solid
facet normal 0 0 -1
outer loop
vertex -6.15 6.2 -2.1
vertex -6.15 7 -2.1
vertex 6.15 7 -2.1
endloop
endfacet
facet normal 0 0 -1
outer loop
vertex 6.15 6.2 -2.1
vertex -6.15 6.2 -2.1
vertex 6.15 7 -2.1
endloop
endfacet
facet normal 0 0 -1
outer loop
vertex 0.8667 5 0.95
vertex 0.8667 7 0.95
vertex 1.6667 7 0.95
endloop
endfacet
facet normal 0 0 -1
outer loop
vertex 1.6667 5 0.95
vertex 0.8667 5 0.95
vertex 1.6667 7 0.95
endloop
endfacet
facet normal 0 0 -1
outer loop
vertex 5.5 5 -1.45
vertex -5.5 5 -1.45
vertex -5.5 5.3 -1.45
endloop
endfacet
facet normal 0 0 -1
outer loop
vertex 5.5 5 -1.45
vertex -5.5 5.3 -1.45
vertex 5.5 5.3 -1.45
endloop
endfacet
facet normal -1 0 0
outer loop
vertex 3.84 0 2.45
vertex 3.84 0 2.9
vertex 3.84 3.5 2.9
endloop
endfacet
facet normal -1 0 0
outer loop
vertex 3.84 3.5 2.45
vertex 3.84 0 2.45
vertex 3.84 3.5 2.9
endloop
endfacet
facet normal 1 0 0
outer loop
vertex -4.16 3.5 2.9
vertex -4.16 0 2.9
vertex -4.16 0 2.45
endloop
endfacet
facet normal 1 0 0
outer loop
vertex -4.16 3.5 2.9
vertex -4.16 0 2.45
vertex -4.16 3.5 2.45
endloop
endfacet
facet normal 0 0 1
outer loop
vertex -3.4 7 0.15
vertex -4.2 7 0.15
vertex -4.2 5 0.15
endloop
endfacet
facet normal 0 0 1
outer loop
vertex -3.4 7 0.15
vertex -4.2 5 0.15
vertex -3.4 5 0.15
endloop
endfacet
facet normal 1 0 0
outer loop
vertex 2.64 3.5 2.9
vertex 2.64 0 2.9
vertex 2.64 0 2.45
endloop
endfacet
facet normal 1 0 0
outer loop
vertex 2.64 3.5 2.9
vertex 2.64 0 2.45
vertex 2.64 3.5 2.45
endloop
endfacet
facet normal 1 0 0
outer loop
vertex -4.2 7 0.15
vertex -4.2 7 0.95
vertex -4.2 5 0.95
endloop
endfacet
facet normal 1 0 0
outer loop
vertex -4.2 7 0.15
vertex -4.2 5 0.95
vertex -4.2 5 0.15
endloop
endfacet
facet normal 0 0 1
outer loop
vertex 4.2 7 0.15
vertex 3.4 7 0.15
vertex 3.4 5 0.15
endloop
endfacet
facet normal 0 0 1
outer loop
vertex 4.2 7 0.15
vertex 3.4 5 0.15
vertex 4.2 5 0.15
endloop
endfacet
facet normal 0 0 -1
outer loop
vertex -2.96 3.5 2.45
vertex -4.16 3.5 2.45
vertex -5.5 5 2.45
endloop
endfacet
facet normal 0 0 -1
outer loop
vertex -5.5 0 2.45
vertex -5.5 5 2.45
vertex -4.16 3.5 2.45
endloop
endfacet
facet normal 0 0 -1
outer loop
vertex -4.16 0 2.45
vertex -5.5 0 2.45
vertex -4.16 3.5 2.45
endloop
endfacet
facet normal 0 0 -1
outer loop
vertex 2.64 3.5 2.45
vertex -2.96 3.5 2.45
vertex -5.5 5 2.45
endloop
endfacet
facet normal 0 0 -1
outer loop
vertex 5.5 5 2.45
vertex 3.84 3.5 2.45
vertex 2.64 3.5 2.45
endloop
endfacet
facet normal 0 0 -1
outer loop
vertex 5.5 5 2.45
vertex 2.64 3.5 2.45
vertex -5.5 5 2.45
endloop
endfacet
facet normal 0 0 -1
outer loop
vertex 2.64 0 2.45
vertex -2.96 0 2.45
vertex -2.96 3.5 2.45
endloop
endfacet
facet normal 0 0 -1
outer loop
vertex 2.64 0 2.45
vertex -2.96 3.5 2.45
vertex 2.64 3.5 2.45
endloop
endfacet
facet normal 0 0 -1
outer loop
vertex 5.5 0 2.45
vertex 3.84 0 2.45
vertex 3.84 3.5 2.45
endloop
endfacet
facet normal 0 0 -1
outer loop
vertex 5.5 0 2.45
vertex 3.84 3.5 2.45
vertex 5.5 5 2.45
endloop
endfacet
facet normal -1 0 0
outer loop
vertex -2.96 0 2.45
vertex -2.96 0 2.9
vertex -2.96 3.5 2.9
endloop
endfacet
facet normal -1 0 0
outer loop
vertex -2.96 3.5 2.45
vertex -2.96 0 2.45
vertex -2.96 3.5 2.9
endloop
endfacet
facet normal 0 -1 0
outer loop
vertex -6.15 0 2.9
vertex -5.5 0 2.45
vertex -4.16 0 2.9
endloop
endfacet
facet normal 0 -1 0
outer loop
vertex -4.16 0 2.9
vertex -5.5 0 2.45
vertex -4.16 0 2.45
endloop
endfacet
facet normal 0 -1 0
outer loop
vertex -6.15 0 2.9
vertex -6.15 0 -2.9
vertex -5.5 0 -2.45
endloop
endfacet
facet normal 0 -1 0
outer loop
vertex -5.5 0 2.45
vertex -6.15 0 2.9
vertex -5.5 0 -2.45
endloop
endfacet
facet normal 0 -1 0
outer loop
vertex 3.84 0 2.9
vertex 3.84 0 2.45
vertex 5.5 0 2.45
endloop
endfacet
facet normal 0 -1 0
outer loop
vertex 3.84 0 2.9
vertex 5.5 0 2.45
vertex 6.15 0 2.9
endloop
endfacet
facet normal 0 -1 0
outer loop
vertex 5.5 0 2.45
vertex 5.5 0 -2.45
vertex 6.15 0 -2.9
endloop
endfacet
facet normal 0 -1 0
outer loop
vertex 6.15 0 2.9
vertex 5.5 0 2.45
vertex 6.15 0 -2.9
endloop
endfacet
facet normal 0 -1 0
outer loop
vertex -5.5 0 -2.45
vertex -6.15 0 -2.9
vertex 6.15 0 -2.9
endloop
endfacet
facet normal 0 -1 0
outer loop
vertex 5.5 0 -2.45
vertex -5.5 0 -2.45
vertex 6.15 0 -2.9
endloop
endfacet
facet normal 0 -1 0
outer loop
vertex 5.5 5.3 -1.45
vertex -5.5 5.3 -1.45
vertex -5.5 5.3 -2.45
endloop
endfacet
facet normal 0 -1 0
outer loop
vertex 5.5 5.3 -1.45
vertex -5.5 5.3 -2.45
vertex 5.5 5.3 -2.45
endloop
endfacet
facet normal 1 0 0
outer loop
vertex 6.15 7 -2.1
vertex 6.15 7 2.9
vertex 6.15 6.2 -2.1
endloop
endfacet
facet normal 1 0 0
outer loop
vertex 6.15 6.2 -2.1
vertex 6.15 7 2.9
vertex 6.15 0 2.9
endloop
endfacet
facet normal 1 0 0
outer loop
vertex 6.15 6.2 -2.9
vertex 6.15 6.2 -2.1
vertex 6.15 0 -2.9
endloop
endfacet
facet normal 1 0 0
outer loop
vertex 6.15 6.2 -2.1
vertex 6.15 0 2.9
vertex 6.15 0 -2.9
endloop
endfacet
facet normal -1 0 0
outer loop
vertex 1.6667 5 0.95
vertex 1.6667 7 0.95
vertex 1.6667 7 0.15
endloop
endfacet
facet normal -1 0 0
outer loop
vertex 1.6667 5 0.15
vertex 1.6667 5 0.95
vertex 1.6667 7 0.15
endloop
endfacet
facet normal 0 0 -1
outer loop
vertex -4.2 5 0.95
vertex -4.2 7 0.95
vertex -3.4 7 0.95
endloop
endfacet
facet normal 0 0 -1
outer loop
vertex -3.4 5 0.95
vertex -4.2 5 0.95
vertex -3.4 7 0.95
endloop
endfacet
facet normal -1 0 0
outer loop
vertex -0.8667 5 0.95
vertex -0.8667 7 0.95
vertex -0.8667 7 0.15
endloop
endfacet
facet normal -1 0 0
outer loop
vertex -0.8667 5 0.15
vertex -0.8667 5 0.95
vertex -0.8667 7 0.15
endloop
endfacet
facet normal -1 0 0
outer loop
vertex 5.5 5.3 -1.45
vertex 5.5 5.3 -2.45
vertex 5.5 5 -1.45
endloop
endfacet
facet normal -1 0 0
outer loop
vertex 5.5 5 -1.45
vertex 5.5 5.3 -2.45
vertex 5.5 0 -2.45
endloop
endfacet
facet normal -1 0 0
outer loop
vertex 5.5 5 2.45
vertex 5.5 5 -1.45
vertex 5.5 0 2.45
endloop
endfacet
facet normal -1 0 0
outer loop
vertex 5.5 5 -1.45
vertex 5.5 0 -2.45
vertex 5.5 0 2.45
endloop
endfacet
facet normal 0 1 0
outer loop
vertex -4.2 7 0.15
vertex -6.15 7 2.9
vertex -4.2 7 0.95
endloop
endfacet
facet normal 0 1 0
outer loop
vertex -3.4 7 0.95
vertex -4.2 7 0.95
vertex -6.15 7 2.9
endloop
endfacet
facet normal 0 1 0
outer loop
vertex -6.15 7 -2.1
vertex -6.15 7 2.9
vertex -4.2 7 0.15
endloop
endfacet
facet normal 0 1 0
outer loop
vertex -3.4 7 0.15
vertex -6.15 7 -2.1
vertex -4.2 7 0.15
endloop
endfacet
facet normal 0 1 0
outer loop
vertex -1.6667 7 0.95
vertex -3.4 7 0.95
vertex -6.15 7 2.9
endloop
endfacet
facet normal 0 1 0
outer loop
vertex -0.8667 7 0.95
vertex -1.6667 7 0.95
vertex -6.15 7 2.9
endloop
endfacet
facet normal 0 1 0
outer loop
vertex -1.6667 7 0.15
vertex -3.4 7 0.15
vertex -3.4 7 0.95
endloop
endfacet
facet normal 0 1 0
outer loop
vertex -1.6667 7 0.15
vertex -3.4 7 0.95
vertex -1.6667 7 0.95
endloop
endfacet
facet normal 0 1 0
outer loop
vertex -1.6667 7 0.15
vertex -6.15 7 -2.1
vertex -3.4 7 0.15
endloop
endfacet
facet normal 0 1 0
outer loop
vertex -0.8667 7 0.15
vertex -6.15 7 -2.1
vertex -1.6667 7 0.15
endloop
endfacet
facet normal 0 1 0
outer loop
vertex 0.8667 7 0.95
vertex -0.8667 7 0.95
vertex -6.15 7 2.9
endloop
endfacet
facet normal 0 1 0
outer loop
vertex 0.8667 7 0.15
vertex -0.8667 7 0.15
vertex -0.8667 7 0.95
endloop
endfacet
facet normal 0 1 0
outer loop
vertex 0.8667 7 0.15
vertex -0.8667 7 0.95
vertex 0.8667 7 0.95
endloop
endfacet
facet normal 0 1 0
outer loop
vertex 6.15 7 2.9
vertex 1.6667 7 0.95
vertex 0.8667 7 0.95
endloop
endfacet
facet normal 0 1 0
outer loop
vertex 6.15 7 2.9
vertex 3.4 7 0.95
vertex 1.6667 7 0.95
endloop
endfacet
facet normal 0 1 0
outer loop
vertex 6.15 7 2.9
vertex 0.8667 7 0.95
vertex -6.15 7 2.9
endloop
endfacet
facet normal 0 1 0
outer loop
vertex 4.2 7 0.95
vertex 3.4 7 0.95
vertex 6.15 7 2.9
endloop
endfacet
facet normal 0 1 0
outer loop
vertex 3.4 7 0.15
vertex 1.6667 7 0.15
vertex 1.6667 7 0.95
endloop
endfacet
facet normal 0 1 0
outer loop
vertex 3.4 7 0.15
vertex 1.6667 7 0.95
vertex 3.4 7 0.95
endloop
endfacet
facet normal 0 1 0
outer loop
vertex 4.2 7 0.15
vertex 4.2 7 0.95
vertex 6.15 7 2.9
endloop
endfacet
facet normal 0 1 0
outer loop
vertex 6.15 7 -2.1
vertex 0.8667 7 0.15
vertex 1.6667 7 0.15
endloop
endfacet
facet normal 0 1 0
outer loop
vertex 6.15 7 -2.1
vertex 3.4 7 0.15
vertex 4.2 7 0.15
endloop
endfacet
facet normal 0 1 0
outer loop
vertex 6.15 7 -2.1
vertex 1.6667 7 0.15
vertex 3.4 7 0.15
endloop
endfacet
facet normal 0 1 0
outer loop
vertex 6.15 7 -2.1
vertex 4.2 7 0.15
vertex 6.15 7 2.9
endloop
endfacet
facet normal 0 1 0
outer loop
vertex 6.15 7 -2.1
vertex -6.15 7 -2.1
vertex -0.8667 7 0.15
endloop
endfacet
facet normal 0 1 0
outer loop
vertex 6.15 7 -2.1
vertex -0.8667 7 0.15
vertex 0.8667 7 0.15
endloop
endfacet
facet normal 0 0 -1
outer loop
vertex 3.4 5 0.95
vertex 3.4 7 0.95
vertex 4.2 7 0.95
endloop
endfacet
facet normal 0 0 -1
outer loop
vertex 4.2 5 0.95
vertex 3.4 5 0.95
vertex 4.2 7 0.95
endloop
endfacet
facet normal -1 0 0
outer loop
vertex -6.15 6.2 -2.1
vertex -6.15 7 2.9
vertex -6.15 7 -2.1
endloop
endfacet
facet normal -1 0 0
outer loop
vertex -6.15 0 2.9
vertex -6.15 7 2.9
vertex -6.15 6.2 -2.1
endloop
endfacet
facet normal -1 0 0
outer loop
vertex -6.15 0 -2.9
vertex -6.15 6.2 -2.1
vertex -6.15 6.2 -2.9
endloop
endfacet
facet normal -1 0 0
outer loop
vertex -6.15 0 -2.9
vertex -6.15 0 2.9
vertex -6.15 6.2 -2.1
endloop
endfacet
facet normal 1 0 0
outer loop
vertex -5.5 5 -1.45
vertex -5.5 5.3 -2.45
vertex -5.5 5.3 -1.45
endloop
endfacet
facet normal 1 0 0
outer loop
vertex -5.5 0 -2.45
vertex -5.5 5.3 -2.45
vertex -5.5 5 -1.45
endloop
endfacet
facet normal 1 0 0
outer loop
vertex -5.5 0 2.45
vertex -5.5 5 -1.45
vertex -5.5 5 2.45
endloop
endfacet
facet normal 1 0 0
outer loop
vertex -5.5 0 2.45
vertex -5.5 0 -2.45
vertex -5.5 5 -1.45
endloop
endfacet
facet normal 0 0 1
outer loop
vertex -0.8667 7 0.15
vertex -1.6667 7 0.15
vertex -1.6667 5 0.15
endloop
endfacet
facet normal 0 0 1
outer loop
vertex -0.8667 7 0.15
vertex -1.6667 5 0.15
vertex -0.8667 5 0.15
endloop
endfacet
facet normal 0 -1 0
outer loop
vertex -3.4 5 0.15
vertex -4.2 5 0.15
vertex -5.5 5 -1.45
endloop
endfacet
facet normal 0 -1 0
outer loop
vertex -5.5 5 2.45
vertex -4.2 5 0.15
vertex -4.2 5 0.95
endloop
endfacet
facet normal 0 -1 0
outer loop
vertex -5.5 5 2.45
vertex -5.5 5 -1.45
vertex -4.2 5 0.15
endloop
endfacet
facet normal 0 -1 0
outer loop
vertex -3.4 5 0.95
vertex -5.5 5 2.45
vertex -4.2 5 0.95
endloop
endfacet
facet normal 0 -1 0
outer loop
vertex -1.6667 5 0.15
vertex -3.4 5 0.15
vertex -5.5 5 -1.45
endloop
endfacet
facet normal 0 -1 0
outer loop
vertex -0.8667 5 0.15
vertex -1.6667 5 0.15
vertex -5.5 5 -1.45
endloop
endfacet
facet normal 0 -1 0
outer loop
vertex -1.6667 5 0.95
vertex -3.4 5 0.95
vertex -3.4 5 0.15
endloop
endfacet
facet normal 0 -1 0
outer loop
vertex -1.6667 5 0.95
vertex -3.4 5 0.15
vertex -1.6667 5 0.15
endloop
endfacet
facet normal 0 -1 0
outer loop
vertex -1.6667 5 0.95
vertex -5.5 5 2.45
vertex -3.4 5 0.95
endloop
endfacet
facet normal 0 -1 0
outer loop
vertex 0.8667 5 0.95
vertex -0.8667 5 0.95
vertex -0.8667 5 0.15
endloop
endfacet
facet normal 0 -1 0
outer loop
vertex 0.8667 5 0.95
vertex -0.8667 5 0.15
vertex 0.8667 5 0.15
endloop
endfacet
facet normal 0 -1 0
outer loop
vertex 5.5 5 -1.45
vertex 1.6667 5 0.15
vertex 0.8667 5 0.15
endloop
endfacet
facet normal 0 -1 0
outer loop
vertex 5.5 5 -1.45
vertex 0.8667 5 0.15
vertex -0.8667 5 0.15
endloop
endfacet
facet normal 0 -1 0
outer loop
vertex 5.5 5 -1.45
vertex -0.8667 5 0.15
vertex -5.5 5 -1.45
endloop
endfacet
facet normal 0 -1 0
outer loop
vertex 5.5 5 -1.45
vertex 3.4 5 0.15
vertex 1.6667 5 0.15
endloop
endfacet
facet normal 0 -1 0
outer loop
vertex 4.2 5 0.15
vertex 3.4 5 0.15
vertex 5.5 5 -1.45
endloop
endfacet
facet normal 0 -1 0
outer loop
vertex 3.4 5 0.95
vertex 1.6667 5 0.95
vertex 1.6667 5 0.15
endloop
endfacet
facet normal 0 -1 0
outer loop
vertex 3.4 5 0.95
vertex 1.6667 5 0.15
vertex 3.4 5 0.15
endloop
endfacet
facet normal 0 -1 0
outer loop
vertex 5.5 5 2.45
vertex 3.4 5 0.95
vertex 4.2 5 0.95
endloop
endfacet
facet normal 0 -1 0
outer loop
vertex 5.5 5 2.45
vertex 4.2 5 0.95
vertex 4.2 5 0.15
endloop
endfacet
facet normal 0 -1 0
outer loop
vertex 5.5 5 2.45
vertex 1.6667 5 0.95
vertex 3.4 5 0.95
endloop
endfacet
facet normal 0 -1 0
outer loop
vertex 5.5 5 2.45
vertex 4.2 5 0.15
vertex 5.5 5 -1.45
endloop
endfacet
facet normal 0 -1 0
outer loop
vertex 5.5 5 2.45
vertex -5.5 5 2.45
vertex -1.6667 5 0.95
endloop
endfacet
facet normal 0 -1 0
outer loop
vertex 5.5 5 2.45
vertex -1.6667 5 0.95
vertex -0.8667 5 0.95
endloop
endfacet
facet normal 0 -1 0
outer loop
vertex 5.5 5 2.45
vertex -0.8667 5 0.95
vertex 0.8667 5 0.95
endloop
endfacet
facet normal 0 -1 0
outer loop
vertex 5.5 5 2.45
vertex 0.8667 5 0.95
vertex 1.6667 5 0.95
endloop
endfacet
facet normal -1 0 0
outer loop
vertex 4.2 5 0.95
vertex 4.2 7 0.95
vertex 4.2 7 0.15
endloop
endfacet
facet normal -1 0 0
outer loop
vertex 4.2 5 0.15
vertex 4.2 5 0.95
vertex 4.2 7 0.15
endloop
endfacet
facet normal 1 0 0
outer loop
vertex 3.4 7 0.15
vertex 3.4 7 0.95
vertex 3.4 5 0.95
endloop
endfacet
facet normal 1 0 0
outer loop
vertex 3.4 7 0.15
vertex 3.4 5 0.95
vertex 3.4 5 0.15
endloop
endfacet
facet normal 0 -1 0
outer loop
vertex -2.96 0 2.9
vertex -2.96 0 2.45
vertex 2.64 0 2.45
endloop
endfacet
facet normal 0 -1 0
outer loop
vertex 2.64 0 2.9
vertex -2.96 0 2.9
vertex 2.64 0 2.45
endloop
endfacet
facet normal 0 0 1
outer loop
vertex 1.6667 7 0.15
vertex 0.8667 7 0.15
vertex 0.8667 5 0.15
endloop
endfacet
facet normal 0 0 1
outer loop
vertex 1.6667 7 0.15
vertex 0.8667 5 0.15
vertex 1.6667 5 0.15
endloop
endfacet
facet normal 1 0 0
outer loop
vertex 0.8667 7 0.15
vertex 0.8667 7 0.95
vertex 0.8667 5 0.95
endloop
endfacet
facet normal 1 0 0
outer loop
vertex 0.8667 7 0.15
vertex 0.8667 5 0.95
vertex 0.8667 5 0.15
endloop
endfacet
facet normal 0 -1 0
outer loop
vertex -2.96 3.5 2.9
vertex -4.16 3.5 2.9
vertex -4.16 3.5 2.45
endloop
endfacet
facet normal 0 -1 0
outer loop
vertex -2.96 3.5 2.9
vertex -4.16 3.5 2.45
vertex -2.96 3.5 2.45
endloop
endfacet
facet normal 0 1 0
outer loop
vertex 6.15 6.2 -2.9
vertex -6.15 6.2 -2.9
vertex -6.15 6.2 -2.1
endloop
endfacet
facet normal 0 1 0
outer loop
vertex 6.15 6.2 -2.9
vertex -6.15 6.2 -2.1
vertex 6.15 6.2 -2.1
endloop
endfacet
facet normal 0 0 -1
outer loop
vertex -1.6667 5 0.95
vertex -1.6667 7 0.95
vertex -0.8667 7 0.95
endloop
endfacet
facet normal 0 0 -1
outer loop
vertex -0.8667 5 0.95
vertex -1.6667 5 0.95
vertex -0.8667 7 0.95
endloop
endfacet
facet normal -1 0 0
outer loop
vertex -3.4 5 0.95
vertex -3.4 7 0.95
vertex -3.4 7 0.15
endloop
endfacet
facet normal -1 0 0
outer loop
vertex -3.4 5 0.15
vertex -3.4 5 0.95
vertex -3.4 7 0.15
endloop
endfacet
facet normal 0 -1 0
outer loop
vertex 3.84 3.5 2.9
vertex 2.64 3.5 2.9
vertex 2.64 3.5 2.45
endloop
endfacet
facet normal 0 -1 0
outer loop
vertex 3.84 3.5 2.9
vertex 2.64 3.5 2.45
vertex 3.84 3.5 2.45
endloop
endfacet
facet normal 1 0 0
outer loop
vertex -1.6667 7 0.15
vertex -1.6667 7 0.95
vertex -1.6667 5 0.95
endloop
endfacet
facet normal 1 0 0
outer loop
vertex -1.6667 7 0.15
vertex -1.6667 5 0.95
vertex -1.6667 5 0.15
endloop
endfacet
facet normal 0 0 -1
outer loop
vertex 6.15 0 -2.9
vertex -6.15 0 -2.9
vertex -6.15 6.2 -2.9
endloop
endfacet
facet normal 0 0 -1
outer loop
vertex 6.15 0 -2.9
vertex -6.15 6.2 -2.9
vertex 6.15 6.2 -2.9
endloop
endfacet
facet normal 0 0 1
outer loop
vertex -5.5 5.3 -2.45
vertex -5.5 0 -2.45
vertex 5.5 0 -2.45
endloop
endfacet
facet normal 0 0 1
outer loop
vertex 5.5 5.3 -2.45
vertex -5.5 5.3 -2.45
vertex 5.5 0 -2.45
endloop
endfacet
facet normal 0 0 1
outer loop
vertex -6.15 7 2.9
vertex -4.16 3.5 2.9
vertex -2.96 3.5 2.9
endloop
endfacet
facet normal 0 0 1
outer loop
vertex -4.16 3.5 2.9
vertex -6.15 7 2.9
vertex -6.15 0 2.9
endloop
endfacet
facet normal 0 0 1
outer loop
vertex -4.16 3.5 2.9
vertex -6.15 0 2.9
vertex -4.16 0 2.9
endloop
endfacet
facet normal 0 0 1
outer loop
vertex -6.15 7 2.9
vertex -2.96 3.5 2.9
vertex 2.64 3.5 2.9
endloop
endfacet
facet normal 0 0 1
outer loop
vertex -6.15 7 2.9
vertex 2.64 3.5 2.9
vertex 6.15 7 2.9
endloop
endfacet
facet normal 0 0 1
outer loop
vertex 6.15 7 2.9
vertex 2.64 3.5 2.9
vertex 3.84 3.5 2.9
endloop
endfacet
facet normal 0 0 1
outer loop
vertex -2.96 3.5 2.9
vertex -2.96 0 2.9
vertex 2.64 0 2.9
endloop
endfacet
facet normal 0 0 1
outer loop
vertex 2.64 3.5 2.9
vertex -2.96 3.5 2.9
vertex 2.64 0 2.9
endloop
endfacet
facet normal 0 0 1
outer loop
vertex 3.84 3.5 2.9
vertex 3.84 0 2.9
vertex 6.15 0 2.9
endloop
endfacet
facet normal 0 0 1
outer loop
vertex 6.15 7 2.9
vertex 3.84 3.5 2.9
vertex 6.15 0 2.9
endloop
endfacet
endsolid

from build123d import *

# Parameters (mm, degrees)
SKETCH1_W           = 12.3
SKETCH1_H           = 5.8
BOSS_EXTRUDE1_DEPTH = 7
SKETCH3_W           = 11
SKETCH3_H           = 4.9
CUT_EXTRUDE1_DEPTH  = 5
SKETCH4_W           = 1.2
SKETCH4_H           = 3.5
CUT_EXTRUDE2_DEPTH  = 4
SKETCH5_W           = 12.3
SKETCH5_H           = 0.8
CUT_EXTRUDE3_DEPTH  = 0.8
SKETCH6_W           = 0.8
SKETCH6_H           = 0.8
CUT_EXTRUDE4_DEPTH  = 10
SKETCH7_W           = 11
SKETCH7_H           = 1
CUT_EXTRUDE5_DEPTH  = 0.3


with BuildPart() as part:
    # Sketch1 → Boss-Extrude1 (new body)
    with BuildSketch(Plane(origin=(0, 0, 0), x_dir=(1, 0, 0), z_dir=(0, 1, 0))):
        Rectangle(SKETCH1_W, SKETCH1_H)
    extrude(amount=BOSS_EXTRUDE1_DEPTH)

    # Sketch3 → Cut-Extrude1 (cut)
    with BuildSketch(Plane.XZ):
        Rectangle(SKETCH3_W, SKETCH3_H)
    extrude(amount=-CUT_EXTRUDE1_DEPTH, mode=Mode.SUBTRACT)

    # Sketch4 → Cut-Extrude2 (cut)
    with BuildSketch(Plane.XY.offset(2.9)):
        with Locations((-3.56, 1.75)):
            Rectangle(SKETCH4_W, SKETCH4_H)
        with Locations((3.24, 1.75)):
            Rectangle(SKETCH4_W, SKETCH4_H)
    extrude(amount=-CUT_EXTRUDE2_DEPTH, mode=Mode.SUBTRACT)

    # Sketch5 → Cut-Extrude3 (cut)
    with BuildSketch(Plane(origin=(0, 7, 0), x_dir=(1, 0, 0), z_dir=(0, 1, 0))):
        with Locations((0, 2.5)):
            Rectangle(SKETCH5_W, SKETCH5_H)
    extrude(amount=-CUT_EXTRUDE3_DEPTH, mode=Mode.SUBTRACT)

    # Sketch6 → Cut-Extrude4 (cut)
    with BuildSketch(Plane(origin=(0, 7, 0), x_dir=(1, 0, 0), z_dir=(0, 1, 0))):
        with Locations((3.8, -0.55)):
            Rectangle(SKETCH6_W, SKETCH6_H)
        with Locations((-1.266666667, -0.55)):
            Rectangle(SKETCH6_W, SKETCH6_H)
        with Locations((1.266666667, -0.55)):
            Rectangle(SKETCH6_W, SKETCH6_H)
        with Locations((-3.8, -0.55)):
            Rectangle(SKETCH6_W, SKETCH6_H)
    extrude(amount=-CUT_EXTRUDE4_DEPTH, mode=Mode.SUBTRACT)

    # Sketch7 → Cut-Extrude5 (cut)
    with BuildSketch(Plane.XZ.offset(-5)):
        with Locations((0, -1.95)):
            Rectangle(SKETCH7_W, SKETCH7_H)
    extrude(amount=-CUT_EXTRUDE5_DEPTH, mode=Mode.SUBTRACT)


solid = part.part
